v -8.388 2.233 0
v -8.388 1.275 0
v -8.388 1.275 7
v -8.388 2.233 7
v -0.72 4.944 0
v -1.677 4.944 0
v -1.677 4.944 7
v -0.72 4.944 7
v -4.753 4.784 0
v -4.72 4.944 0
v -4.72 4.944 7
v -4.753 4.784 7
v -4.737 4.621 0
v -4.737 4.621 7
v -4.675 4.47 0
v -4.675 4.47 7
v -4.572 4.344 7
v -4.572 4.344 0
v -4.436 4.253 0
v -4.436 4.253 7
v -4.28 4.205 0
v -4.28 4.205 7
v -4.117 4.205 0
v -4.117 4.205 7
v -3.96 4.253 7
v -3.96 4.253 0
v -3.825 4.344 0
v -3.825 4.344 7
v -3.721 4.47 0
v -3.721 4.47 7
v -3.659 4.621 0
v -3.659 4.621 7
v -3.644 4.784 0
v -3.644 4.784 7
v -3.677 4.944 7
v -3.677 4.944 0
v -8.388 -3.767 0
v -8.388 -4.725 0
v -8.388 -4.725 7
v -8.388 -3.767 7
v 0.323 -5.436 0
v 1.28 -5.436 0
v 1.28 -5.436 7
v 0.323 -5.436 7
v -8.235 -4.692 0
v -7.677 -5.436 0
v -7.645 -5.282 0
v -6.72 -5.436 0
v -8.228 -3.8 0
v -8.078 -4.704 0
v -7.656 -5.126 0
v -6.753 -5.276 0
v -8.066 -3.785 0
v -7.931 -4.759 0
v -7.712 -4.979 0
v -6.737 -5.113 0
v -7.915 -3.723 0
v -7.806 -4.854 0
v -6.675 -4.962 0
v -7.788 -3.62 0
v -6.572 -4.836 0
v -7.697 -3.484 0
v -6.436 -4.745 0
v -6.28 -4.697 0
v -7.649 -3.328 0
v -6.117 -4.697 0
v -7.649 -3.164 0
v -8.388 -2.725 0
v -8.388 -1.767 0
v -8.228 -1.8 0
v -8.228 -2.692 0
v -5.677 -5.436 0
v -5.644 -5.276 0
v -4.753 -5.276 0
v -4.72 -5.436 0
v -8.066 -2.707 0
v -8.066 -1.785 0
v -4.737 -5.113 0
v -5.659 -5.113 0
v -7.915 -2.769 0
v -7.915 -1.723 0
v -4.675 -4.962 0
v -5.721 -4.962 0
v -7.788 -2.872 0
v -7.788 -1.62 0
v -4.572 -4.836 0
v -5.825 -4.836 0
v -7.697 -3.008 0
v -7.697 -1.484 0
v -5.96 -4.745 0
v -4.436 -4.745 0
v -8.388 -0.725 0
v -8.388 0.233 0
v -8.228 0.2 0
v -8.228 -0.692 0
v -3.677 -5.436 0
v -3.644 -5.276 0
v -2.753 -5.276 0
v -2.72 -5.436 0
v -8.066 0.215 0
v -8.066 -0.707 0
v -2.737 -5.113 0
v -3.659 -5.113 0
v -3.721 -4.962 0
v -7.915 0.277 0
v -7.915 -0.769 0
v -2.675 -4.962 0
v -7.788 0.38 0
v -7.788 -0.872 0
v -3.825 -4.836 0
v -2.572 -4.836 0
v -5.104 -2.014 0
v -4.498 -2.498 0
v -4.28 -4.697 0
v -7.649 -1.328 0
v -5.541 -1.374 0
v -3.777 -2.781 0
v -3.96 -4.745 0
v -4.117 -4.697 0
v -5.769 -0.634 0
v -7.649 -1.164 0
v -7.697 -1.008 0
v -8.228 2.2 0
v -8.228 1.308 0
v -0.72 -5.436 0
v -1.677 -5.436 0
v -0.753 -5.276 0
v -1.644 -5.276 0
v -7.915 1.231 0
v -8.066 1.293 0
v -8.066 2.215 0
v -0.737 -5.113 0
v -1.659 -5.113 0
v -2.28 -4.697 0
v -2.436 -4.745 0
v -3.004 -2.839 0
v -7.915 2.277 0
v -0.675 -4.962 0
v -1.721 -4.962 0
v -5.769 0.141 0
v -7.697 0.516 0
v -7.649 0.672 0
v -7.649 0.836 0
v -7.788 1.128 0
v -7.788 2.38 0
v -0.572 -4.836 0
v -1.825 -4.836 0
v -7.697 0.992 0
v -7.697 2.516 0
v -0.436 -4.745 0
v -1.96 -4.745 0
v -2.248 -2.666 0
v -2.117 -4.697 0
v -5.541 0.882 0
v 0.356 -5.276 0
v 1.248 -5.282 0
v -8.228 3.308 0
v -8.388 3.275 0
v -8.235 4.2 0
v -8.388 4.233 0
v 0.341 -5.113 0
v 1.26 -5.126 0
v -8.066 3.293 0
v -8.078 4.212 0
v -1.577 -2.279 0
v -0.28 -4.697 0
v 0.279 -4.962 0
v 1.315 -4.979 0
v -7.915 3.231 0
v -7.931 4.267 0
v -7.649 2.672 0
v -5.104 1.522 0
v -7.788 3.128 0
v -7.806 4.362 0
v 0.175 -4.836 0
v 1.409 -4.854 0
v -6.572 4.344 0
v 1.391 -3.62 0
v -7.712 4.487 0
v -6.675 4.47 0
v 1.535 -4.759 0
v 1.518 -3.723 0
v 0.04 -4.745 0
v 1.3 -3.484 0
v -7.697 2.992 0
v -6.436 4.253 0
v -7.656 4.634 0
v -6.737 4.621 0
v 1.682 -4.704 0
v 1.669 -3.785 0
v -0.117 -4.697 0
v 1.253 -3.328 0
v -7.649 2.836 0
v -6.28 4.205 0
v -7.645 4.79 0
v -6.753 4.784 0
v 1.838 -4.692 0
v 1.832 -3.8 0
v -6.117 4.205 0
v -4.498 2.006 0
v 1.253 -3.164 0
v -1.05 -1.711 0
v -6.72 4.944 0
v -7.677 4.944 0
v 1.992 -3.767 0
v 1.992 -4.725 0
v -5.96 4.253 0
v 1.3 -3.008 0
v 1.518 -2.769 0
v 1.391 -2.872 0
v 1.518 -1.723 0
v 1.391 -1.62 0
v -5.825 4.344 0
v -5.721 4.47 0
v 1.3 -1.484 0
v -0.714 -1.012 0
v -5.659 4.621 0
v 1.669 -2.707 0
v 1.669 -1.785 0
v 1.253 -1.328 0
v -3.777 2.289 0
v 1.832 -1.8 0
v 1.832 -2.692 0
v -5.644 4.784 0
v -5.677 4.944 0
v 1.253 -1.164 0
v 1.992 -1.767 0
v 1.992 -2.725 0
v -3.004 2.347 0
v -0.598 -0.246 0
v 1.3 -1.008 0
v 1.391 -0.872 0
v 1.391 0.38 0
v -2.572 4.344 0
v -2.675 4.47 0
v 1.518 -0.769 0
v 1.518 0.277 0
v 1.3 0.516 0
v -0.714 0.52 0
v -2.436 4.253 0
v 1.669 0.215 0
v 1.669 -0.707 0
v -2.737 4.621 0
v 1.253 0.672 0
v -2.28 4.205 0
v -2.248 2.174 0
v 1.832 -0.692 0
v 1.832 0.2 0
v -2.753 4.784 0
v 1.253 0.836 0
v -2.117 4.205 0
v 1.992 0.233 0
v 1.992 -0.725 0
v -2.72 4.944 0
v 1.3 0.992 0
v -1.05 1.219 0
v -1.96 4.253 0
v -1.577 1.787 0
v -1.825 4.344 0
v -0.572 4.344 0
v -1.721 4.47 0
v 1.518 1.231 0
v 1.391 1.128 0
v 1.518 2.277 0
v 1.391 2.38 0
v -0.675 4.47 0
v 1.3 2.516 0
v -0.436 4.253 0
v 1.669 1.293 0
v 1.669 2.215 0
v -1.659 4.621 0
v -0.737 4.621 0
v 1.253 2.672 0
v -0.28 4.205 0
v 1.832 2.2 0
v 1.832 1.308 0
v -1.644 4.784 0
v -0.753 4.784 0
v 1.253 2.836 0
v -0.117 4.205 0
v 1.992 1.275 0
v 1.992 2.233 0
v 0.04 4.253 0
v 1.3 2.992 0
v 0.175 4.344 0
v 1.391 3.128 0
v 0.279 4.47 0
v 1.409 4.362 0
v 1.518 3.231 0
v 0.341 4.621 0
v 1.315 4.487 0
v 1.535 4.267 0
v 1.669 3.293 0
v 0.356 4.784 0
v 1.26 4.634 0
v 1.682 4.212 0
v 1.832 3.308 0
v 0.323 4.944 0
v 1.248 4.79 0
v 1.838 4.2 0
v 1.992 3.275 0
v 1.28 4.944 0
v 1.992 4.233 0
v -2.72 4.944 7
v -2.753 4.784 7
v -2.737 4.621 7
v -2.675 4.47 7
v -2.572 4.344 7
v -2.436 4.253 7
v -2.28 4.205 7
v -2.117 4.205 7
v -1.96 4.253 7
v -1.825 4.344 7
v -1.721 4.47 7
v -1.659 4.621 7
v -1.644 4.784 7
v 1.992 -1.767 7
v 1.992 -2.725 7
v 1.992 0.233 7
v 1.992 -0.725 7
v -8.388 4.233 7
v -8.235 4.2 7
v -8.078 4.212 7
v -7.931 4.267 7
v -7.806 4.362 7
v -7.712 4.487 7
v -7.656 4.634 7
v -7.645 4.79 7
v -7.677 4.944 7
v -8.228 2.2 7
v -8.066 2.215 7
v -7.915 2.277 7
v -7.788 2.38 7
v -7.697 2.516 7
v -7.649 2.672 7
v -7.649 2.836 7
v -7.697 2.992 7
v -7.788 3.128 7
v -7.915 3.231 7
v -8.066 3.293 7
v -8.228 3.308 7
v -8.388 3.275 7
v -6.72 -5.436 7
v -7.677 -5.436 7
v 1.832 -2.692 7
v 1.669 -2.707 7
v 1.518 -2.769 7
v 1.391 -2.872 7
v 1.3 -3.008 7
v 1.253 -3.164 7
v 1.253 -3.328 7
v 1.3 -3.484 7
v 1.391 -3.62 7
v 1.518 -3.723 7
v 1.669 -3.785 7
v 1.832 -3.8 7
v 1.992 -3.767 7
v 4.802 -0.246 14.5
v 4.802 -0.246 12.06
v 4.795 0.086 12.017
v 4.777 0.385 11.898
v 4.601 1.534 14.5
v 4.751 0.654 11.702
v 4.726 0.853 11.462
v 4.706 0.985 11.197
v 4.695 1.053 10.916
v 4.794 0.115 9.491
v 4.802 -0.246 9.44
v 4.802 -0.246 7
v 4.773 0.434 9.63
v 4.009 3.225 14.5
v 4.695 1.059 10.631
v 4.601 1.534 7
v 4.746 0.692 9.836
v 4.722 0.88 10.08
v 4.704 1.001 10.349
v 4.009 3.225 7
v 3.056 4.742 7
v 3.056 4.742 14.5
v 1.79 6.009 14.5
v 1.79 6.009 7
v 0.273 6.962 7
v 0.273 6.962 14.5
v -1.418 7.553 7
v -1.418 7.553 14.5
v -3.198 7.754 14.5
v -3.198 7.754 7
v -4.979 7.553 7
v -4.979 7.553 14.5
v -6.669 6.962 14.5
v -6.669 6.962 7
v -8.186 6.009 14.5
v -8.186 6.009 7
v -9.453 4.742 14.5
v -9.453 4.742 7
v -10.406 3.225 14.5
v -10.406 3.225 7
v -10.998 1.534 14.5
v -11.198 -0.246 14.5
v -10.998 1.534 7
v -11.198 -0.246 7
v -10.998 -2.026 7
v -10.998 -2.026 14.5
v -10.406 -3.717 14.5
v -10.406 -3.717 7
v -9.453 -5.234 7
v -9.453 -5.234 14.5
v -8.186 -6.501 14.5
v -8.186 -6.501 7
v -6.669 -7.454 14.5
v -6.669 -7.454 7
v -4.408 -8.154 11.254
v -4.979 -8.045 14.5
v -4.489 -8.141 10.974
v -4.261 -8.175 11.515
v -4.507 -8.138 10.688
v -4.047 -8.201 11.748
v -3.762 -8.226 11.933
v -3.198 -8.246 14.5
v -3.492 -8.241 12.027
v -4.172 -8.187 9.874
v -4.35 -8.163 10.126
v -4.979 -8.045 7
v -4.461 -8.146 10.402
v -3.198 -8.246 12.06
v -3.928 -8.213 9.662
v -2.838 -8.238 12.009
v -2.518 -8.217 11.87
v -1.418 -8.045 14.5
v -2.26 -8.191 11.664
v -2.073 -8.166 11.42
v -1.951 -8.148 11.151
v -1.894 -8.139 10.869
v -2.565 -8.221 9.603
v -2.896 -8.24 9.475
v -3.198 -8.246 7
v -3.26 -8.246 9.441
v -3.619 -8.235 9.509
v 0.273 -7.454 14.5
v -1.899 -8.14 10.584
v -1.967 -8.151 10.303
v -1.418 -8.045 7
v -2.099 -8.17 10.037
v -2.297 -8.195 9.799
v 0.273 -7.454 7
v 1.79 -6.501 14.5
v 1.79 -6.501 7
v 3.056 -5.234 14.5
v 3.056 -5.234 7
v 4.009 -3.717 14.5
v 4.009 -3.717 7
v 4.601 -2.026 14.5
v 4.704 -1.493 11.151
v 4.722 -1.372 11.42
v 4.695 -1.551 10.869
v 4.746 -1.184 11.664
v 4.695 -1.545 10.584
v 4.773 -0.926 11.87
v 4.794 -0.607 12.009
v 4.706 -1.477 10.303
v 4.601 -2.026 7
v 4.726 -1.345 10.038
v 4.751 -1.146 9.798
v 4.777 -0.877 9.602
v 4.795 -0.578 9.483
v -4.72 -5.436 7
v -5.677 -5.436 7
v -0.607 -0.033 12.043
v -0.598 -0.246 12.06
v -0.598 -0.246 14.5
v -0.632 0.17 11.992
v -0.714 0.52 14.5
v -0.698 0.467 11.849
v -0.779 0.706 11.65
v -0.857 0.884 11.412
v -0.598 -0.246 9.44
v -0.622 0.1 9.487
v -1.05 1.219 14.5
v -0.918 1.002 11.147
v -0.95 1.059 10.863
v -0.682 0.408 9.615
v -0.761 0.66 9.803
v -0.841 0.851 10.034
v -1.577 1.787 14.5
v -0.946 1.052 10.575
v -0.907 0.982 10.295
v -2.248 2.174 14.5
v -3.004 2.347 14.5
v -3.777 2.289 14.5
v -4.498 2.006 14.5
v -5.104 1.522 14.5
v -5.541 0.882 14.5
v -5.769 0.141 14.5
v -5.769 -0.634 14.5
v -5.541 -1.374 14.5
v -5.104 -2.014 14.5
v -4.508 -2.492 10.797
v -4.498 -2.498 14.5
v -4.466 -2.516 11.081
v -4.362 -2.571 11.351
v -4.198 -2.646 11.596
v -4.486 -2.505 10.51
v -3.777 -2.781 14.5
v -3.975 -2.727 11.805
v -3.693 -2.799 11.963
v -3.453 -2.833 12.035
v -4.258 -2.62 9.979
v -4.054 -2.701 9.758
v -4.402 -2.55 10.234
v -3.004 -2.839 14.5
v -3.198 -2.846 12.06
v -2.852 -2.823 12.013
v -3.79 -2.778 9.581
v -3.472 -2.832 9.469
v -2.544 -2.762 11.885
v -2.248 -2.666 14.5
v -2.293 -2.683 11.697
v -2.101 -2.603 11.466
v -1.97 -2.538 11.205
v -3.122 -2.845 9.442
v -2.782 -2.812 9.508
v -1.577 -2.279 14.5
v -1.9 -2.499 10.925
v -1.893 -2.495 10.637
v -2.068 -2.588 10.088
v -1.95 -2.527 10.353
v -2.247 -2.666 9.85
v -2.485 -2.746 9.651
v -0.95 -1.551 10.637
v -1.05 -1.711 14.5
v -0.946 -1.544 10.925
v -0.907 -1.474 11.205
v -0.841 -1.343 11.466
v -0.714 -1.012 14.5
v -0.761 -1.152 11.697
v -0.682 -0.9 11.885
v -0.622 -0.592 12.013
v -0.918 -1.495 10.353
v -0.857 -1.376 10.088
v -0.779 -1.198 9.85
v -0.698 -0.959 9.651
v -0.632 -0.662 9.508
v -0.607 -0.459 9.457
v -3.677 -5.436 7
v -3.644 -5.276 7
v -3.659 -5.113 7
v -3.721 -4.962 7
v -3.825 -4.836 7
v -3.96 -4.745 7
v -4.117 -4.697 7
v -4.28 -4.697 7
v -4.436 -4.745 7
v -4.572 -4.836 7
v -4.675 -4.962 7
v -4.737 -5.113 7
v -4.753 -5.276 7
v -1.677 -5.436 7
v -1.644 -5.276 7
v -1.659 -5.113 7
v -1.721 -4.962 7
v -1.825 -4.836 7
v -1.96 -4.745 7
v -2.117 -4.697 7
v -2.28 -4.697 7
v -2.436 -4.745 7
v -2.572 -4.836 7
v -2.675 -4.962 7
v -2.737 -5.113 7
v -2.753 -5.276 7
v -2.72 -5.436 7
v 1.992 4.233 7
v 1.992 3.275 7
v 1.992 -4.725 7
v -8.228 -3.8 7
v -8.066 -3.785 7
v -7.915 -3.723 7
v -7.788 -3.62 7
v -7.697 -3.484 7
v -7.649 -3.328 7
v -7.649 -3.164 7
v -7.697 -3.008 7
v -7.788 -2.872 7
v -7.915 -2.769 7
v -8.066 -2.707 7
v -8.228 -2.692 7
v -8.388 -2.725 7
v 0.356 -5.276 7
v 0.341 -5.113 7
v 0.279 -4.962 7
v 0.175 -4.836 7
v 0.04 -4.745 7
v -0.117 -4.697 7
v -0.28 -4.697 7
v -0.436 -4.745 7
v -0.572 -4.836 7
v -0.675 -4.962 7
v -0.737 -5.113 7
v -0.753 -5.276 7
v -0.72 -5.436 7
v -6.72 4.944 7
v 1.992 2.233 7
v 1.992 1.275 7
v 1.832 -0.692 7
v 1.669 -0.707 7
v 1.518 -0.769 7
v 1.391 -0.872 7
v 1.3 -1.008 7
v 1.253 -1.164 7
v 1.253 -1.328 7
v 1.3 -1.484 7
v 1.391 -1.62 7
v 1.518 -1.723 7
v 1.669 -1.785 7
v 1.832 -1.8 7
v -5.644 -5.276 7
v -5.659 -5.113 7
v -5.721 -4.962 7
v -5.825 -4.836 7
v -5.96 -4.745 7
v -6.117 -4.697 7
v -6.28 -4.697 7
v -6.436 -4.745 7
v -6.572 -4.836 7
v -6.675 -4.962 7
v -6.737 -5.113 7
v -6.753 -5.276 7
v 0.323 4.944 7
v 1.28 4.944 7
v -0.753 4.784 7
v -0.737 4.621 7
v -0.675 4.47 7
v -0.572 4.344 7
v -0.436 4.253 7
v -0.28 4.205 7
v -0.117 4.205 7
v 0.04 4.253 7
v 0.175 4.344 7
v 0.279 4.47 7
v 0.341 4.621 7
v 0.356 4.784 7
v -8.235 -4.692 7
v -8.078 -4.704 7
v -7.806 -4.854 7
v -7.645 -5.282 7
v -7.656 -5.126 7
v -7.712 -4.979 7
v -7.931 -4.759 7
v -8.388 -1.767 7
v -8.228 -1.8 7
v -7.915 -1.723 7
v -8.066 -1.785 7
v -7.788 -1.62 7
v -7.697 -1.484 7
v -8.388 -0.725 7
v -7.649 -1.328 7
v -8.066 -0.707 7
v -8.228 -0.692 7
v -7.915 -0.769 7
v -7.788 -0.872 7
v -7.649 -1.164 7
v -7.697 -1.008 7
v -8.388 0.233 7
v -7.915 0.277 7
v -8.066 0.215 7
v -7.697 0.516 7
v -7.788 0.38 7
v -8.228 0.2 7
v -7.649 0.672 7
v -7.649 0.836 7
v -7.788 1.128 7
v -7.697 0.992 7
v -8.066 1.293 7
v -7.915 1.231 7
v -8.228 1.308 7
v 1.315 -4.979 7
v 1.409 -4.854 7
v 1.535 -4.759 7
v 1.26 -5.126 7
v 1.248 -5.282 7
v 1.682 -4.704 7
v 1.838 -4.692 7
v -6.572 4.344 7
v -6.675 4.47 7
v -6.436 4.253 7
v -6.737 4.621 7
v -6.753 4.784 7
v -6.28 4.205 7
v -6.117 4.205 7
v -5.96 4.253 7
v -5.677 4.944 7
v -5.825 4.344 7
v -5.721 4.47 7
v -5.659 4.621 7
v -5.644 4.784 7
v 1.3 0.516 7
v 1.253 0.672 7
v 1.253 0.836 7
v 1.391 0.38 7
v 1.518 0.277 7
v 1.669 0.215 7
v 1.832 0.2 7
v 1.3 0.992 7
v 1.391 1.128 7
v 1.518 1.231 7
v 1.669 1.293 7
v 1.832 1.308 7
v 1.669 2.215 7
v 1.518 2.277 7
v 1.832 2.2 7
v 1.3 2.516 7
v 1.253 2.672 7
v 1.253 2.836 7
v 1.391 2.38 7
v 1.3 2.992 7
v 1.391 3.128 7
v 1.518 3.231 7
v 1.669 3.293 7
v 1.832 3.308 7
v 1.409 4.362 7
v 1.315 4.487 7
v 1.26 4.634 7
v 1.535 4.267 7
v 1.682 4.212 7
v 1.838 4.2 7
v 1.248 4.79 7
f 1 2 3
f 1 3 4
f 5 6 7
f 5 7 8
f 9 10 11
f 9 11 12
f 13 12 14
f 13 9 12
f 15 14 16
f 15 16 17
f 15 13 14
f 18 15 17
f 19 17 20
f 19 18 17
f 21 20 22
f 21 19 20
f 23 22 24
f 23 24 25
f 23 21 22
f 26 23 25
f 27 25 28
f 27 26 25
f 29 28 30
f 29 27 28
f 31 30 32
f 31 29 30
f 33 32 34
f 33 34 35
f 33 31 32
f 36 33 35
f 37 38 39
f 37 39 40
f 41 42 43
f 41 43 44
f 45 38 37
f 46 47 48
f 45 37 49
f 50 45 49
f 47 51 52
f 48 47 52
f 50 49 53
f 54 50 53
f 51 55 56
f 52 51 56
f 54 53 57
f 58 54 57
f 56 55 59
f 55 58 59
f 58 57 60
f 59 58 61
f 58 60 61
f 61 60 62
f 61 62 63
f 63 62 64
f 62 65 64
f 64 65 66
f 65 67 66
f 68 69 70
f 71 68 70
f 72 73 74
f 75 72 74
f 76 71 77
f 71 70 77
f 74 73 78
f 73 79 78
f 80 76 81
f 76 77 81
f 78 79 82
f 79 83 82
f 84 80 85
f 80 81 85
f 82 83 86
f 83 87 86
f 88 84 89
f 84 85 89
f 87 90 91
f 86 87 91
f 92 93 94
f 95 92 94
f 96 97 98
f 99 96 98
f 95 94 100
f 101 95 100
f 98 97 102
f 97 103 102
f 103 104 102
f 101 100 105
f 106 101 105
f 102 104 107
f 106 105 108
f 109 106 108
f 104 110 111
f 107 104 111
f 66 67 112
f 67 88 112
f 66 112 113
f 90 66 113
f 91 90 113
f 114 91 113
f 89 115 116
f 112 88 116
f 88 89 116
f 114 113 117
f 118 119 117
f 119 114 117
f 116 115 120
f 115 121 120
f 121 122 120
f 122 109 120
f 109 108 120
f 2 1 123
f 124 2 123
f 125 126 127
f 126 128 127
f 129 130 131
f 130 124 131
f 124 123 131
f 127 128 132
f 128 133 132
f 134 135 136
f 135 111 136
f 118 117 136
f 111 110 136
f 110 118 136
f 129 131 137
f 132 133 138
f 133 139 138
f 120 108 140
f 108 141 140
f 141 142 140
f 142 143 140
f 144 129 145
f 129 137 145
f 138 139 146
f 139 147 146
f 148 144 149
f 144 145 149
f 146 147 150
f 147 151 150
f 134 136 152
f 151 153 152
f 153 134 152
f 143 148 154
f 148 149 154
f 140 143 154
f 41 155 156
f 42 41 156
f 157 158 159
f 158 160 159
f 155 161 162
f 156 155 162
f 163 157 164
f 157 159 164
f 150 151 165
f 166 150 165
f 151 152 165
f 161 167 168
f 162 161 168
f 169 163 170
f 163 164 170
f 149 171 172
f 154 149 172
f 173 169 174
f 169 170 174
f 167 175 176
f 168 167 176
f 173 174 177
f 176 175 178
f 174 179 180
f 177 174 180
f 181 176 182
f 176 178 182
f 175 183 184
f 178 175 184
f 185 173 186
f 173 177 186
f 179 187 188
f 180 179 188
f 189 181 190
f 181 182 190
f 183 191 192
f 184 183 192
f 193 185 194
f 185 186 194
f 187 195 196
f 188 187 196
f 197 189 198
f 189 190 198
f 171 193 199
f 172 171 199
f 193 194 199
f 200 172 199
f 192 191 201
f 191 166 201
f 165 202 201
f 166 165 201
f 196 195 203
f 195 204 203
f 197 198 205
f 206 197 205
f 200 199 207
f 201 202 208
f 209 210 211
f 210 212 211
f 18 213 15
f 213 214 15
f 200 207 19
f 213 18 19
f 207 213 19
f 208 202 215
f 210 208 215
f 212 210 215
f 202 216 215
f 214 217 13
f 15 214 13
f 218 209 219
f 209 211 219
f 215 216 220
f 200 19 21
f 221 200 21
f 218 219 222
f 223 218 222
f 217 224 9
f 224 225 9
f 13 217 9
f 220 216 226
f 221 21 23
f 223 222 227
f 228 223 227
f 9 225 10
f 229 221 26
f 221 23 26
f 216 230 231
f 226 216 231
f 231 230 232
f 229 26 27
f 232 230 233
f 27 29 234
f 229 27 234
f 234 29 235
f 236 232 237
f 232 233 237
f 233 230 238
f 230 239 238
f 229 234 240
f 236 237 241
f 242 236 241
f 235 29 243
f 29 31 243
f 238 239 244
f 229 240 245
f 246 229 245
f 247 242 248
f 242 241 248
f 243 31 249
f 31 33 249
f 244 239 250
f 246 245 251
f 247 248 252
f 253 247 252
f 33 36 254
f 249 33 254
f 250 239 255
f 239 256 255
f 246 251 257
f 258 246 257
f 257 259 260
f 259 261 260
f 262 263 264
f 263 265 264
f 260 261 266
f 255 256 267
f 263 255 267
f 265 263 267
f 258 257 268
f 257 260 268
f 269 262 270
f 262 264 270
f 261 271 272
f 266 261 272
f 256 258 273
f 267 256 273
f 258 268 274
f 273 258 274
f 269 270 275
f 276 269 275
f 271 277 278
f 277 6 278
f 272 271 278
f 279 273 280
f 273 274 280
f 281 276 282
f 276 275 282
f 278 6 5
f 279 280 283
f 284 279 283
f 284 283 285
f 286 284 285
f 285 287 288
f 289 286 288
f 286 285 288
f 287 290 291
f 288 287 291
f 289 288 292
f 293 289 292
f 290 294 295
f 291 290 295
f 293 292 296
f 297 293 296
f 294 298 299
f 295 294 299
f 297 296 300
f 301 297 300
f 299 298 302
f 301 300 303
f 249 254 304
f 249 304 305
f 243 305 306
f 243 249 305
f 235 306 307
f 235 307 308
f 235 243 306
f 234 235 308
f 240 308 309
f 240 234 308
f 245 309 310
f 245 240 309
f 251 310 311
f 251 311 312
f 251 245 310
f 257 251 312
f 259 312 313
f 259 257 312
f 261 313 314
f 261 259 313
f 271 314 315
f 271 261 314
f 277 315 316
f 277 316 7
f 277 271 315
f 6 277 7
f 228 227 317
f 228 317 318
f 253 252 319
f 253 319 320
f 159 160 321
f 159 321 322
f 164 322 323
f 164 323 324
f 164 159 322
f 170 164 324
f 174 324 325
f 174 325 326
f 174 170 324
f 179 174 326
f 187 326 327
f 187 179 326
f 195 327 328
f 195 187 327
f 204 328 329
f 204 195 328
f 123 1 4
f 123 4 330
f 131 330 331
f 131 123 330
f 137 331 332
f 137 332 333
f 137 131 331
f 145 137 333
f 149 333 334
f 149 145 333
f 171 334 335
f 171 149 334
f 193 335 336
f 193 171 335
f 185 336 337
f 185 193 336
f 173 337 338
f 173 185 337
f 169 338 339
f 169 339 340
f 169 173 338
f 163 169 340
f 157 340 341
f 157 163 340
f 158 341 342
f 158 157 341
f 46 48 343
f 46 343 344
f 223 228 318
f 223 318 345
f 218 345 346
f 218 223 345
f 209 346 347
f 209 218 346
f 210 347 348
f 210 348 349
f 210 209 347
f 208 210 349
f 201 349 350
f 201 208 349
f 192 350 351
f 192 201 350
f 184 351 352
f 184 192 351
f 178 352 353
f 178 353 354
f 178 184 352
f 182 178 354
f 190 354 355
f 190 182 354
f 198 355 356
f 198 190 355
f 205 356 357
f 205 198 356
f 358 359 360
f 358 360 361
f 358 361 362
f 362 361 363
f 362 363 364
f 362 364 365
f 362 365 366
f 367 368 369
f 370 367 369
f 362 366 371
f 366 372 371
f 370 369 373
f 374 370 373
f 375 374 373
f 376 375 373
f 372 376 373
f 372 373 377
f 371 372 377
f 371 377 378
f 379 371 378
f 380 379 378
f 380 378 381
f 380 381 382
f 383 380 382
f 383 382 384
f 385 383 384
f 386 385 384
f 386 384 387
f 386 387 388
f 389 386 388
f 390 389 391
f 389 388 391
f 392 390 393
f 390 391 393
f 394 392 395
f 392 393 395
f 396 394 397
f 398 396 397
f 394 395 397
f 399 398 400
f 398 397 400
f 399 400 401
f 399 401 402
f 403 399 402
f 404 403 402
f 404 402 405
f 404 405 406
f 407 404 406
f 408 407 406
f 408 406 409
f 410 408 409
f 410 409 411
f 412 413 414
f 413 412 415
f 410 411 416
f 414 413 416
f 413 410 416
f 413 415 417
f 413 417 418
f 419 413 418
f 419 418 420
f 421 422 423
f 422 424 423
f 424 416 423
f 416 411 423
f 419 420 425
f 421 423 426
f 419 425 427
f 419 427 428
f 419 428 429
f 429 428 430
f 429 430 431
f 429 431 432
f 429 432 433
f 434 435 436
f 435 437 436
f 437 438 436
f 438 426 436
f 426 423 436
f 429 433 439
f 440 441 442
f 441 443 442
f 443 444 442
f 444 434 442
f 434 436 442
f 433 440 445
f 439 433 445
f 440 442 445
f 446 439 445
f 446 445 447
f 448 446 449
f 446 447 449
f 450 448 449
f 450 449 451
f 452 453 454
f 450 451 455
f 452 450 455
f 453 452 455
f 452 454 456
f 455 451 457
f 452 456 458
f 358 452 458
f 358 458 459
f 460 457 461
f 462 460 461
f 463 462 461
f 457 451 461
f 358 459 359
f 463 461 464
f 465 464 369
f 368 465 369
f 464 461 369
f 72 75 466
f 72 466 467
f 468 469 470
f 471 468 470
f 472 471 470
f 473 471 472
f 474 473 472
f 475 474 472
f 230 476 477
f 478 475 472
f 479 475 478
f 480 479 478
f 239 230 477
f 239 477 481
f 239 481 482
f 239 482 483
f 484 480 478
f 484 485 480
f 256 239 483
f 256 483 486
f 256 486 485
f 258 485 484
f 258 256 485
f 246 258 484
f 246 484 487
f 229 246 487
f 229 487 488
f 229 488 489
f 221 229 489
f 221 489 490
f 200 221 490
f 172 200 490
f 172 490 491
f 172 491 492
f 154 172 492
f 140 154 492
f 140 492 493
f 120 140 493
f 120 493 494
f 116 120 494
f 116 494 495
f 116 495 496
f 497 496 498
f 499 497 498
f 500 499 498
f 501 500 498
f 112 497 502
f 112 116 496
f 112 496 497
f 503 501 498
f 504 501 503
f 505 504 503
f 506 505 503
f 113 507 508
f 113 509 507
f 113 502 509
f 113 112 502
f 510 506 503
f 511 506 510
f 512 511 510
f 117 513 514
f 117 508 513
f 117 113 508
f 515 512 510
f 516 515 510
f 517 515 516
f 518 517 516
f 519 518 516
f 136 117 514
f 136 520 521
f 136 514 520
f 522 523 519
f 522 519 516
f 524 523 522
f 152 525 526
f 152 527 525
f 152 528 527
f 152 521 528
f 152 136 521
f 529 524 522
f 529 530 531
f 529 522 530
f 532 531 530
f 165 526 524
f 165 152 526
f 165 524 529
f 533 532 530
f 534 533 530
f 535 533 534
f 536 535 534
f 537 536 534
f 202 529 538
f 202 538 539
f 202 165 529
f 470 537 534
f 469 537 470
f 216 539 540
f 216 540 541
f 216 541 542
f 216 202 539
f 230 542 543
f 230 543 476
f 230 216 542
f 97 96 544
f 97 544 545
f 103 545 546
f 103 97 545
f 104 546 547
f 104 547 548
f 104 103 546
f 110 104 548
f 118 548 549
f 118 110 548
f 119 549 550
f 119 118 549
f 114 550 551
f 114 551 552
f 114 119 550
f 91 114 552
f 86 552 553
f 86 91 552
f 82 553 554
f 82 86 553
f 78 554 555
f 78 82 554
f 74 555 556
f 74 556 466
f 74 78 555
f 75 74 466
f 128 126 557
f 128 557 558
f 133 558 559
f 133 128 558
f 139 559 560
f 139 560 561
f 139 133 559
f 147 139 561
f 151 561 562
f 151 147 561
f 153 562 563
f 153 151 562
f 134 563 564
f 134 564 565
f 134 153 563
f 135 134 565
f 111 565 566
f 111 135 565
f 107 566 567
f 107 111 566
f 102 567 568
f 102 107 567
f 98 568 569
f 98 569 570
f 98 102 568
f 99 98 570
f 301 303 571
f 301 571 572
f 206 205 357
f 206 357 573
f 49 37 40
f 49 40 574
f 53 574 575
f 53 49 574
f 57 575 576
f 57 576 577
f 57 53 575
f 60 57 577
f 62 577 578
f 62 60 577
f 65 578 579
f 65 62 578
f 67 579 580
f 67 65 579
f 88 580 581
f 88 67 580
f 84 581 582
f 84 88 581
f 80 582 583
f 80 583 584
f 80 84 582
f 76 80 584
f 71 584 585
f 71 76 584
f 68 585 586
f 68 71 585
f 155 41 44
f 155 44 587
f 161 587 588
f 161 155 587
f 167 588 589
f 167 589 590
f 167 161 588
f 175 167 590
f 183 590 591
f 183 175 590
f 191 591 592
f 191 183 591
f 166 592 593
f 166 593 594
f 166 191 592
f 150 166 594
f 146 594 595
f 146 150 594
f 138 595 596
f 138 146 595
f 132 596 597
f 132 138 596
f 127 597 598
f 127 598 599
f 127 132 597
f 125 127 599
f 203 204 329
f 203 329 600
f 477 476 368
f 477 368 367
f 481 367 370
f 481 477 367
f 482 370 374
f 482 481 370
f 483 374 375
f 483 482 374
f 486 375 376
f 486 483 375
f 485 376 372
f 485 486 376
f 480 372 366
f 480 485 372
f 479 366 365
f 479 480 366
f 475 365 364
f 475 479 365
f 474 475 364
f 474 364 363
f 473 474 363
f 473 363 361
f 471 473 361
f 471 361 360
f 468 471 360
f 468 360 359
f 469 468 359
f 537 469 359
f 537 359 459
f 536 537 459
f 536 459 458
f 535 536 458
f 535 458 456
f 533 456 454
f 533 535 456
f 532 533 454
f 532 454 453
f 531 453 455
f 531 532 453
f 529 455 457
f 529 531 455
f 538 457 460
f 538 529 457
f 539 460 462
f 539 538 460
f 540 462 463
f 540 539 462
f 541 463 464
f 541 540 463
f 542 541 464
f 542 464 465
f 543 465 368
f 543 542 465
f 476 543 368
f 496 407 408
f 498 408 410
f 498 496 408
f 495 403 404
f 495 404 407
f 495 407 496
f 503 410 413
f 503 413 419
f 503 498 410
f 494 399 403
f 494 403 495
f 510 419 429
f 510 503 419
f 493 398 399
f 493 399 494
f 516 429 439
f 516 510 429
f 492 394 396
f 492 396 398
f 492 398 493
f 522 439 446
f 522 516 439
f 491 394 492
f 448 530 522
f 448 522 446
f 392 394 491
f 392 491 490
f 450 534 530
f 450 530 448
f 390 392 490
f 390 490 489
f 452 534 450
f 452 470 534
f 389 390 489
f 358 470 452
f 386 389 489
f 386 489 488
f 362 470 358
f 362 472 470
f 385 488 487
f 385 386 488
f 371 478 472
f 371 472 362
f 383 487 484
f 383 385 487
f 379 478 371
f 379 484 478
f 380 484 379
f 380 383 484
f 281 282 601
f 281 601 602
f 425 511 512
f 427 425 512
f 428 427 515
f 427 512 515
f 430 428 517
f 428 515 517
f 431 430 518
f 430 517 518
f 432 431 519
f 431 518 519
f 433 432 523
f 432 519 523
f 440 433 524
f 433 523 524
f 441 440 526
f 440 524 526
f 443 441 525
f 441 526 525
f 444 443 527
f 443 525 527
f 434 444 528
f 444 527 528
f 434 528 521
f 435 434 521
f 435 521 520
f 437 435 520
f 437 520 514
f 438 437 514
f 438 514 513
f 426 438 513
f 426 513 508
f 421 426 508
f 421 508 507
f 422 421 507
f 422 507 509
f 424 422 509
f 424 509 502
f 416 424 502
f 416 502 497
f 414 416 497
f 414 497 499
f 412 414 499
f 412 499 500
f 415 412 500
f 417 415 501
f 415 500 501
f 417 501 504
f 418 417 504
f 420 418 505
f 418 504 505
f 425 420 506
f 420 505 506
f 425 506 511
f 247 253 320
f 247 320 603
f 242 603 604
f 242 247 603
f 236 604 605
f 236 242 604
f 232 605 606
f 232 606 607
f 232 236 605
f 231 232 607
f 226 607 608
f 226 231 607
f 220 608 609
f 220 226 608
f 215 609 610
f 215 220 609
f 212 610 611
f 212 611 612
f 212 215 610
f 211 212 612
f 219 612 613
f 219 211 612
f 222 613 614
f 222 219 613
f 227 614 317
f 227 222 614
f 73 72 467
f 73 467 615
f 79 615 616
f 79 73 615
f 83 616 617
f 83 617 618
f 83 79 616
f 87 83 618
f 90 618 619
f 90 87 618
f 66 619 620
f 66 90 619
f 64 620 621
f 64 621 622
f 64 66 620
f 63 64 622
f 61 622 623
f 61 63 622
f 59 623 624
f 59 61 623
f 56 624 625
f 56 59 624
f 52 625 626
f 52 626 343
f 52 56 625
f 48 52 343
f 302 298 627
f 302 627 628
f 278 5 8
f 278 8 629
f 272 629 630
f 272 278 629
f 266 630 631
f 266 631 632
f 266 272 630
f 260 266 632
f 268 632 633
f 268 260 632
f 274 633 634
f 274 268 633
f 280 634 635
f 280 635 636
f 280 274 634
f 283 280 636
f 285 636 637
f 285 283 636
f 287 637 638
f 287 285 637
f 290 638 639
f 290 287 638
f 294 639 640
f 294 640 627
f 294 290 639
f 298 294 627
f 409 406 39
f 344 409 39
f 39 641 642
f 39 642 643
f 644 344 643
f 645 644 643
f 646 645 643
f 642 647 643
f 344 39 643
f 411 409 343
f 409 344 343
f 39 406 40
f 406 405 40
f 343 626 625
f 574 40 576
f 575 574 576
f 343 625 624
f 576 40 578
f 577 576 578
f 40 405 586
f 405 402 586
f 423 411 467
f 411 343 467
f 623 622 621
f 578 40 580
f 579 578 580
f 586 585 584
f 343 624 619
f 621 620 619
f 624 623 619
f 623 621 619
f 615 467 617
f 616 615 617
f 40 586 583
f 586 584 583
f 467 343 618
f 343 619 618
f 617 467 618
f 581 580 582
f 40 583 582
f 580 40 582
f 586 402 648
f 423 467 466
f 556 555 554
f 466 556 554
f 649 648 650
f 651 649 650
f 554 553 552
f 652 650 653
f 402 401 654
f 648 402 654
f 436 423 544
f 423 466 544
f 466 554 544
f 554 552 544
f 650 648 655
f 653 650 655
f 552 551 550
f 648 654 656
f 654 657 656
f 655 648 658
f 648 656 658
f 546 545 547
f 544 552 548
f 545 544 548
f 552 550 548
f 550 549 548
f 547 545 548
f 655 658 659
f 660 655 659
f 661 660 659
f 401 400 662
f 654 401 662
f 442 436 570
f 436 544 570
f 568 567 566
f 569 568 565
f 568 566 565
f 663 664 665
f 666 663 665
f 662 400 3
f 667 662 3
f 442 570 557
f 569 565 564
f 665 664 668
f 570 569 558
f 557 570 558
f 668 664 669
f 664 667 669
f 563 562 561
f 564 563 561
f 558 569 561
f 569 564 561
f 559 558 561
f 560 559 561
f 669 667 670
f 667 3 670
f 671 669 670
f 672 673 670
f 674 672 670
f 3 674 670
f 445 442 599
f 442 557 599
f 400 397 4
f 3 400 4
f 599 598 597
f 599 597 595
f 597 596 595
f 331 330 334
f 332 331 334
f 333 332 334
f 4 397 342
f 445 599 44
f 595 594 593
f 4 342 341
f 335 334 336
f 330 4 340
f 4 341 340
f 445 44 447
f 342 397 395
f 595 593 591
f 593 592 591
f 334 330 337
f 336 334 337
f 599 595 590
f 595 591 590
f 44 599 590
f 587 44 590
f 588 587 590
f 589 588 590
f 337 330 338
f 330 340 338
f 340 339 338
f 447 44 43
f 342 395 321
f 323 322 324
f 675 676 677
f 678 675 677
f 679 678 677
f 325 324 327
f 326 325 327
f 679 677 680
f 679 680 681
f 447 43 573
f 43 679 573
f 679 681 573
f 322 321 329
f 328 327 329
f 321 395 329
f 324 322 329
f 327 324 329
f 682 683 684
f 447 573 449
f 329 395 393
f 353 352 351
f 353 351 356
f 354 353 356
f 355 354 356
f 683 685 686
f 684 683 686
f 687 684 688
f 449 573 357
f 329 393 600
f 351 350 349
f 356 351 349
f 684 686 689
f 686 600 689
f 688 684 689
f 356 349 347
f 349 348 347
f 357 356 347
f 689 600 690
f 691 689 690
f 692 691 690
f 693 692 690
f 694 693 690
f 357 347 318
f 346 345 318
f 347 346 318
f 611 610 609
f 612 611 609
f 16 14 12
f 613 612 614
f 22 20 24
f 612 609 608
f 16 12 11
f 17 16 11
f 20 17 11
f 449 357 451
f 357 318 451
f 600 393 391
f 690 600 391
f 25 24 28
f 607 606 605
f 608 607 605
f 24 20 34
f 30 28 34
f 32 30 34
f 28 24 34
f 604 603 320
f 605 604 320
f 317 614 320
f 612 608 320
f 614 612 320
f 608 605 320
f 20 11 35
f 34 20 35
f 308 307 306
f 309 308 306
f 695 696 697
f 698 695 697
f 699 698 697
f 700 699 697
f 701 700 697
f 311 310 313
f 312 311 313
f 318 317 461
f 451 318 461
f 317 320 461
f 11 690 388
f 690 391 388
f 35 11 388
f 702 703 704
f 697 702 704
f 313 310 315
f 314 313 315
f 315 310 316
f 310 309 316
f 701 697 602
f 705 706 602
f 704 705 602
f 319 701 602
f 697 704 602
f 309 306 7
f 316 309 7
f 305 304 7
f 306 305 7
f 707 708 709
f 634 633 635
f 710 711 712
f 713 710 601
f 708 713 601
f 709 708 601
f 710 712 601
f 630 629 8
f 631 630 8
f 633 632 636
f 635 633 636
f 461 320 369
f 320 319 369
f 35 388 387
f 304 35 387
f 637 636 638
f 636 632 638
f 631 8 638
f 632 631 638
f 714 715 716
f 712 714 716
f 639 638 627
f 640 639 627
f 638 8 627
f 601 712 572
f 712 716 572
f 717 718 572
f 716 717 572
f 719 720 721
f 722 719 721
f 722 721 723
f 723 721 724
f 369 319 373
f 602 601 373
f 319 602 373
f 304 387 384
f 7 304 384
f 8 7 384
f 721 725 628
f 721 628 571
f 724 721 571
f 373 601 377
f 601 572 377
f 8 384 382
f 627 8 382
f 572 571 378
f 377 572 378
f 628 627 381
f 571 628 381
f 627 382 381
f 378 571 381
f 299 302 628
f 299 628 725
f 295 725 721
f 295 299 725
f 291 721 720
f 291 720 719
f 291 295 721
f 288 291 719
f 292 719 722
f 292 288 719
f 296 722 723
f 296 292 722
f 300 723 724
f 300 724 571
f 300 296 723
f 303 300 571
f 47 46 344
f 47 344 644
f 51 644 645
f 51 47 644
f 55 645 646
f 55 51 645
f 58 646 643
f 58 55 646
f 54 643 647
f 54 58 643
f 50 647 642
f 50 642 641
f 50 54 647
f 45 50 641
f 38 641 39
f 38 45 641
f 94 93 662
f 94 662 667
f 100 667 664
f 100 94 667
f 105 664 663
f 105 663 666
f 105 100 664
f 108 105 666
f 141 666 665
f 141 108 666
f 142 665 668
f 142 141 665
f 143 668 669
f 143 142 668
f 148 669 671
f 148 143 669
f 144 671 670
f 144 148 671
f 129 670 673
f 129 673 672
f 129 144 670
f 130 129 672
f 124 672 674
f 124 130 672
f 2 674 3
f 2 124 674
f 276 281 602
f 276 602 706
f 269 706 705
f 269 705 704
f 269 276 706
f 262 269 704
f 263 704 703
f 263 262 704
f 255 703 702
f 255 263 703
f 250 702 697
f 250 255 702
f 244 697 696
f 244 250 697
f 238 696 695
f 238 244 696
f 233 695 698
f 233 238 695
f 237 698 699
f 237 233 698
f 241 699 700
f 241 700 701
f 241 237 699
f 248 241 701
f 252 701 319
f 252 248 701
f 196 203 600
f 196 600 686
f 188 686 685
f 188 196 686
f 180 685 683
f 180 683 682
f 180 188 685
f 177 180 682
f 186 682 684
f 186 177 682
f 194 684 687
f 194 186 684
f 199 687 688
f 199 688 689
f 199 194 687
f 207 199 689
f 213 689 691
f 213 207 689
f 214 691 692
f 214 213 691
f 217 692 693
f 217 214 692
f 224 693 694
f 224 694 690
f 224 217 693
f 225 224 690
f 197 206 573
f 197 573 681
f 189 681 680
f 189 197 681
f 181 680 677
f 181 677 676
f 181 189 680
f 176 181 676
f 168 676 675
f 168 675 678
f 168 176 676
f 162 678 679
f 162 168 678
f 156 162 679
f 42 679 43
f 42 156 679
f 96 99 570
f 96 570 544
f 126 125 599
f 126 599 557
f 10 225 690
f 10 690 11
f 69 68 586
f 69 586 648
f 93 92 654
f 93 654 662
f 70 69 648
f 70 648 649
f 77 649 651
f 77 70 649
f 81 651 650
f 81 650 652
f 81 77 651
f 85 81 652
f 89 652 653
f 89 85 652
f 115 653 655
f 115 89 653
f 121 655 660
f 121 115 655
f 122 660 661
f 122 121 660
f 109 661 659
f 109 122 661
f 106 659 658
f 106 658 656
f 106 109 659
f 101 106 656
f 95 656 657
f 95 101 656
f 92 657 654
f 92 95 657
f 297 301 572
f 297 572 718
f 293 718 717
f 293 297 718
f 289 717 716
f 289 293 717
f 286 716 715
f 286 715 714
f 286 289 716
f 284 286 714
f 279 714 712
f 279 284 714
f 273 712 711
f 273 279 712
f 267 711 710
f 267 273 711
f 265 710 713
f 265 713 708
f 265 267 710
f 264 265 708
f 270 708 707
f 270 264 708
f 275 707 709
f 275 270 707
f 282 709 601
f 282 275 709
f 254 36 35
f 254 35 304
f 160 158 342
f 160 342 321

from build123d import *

# Parameters (mm, degrees)
SKETCH2_R               = 4.1
SKETCH2_R_2             = 2.6
BOSS_EXTRUDE1_DEPTH     = 7
SKETCH3_R               = 8
SKETCH3_R_2             = 2.6
BOSS_EXTRUDE2_DEPTH     = 7.5
SKETCH4_R               = 1.31
CUT_EXTRUDE1_DEPTH      = 9
CUT_EXTRUDE2_DEPTH      = 5
CUT_EXTRUDE2_DEPTH_BACK = 2
SKETCH5_R               = 1.31


with BuildPart() as part:
    # Sketch2 → Boss-Extrude1 (new body)
    # profile 1 of 2: a face of its own
    with BuildSketch(Plane.XY):
        with BuildLine():
            ThreePointArc((-8.388352144, 2.232508627), (-7.643352144, 2.753972912), (-8.388352144, 3.275437196))
            Line((-8.388352144, 3.275437196), (-8.388352144, 4.232508627))
            ThreePointArc((-8.388352144, 4.232508627), (-7.805907881, 4.361528648), (-7.67688786, 4.943972912))
            Line((-7.67688786, 4.943972912), (-6.719816429, 4.943972912))
            ThreePointArc((-6.719816429, 4.943972912), (-6.198352144, 4.198972912), (-5.67688786, 4.943972912))
            Line((-5.67688786, 4.943972912), (-4.719816429, 4.943972912))
            ThreePointArc((-4.719816429, 4.943972912), (-4.198352144, 4.198972912), (-3.67688786, 4.943972912))
            Line((-3.67688786, 4.943972912), (-2.719816429, 4.943972912))
            ThreePointArc((-2.719816429, 4.943972912), (-2.198352144, 4.198972912), (-1.67688786, 4.943972912))
            Line((-1.67688786, 4.943972912), (-0.719816429, 4.943972912))
            ThreePointArc((-0.719816429, 4.943972912), (-0.198352144, 4.198972912), (0.32311214, 4.943972912))
            Line((0.32311214, 4.943972912), (1.280183571, 4.943972912))
            ThreePointArc((1.280183571, 4.943972912), (1.409203592, 4.361528648), (1.991647856, 4.232508627))
            Line((1.991647856, 4.232508627), (1.991647856, 3.275437196))
            ThreePointArc((1.991647856, 3.275437196), (1.246647856, 2.753972912), (1.991647856, 2.232508627))
            Line((1.991647856, 2.232508627), (1.991647856, 1.275437196))
            ThreePointArc((1.991647856, 1.275437196), (1.246647856, 0.753972912), (1.991647856, 0.232508627))
            Line((1.991647856, 0.232508627), (1.991647856, -0.724562804))
            ThreePointArc((1.991647856, -0.724562804), (1.246647856, -1.246027088), (1.991647856, -1.767491373))
            Line((1.991647856, -1.767491373), (1.991647856, -2.724562804))
            ThreePointArc((1.991647856, -2.724562804), (1.246647856, -3.246027088), (1.991647856, -3.767491373))
            Line((1.991647856, -3.767491373), (1.991647856, -4.724562804))
            ThreePointArc((1.991647856, -4.724562804), (1.409203592, -4.853582824), (1.280183571, -5.436027088))
            Line((1.280183571, -5.436027088), (0.32311214, -5.436027088))
            ThreePointArc((0.32311214, -5.436027088), (-0.198352144, -4.691027088), (-0.719816429, -5.436027088))
            Line((-0.719816429, -5.436027088), (-1.67688786, -5.436027088))
            ThreePointArc((-1.67688786, -5.436027088), (-2.198352144, -4.691027088), (-2.719816429, -5.436027088))
            Line((-2.719816429, -5.436027088), (-3.67688786, -5.436027088))
            ThreePointArc((-3.67688786, -5.436027088), (-4.198352144, -4.691027088), (-4.719816429, -5.436027088))
            Line((-4.719816429, -5.436027088), (-5.67688786, -5.436027088))
            ThreePointArc((-5.67688786, -5.436027088), (-6.198352144, -4.691027088), (-6.719816429, -5.436027088))
            Line((-6.719816429, -5.436027088), (-7.67688786, -5.436027088))
            ThreePointArc((-7.67688786, -5.436027088), (-7.805907881, -4.853582824), (-8.388352144, -4.724562804))
            Line((-8.388352144, -4.724562804), (-8.388352144, -3.767491373))
            ThreePointArc((-8.388352144, -3.767491373), (-7.643352144, -3.246027088), (-8.388352144, -2.724562804))
            Line((-8.388352144, -2.724562804), (-8.388352144, -1.767491373))
            ThreePointArc((-8.388352144, -1.767491373), (-7.643352144, -1.246027088), (-8.388352144, -0.724562804))
            Line((-8.388352144, -0.724562804), (-8.388352144, 0.232508627))
            ThreePointArc((-8.388352144, 0.232508627), (-7.643352144, 0.753972912), (-8.388352144, 1.275437196))
            Line((-8.388352144, 1.275437196), (-8.388352144, 2.232508627))
        make_face()
        with Locations((-3.198352144, -0.246027088)):
            Circle(SKETCH2_R, mode=Mode.SUBTRACT)
    # profile 2 of 2: a face of its own
    with BuildSketch(Plane.XY):
        with Locations((-3.198352144, -0.246027088)):
            Circle(SKETCH2_R)
        with Locations((-3.198352144, -0.246027088)):
            Circle(SKETCH2_R_2, mode=Mode.SUBTRACT)
    extrude(amount=BOSS_EXTRUDE1_DEPTH)

    # Sketch3 → Boss-Extrude2 (add)
    with BuildSketch(Plane.XY.offset(7)):
        with Locations((-3.198352144, -0.246027088)):
            Circle(SKETCH3_R)
        with Locations((-3.198352144, -0.246027088)):
            Circle(SKETCH3_R_2, mode=Mode.SUBTRACT)
    extrude(amount=BOSS_EXTRUDE2_DEPTH)

    # Sketch4 → Cut-Extrude1 (cut)
    with BuildSketch(Plane(origin=(0, 0, 0), x_dir=(1, 0, 0), z_dir=(0, 1, 0))):
        with Locations(Location((-3.198352144, -10.75, 0), (0, 0, 270))):
            Circle(SKETCH4_R)
    extrude(amount=-CUT_EXTRUDE1_DEPTH, mode=Mode.SUBTRACT)

    # Sketch5 → Cut-Extrude2 (cut, two sides: drawn at the far end of the back side and taken through both)
    with BuildSketch(Plane(origin=(0, 0, 0), x_dir=(0, 0, -1), z_dir=(1, 0, 0)).offset(-CUT_EXTRUDE2_DEPTH_BACK)):
        with Locations((-10.75, -0.246027088)):
            Circle(SKETCH5_R)
    extrude(amount=CUT_EXTRUDE2_DEPTH + CUT_EXTRUDE2_DEPTH_BACK, mode=Mode.SUBTRACT)


solid = part.part
